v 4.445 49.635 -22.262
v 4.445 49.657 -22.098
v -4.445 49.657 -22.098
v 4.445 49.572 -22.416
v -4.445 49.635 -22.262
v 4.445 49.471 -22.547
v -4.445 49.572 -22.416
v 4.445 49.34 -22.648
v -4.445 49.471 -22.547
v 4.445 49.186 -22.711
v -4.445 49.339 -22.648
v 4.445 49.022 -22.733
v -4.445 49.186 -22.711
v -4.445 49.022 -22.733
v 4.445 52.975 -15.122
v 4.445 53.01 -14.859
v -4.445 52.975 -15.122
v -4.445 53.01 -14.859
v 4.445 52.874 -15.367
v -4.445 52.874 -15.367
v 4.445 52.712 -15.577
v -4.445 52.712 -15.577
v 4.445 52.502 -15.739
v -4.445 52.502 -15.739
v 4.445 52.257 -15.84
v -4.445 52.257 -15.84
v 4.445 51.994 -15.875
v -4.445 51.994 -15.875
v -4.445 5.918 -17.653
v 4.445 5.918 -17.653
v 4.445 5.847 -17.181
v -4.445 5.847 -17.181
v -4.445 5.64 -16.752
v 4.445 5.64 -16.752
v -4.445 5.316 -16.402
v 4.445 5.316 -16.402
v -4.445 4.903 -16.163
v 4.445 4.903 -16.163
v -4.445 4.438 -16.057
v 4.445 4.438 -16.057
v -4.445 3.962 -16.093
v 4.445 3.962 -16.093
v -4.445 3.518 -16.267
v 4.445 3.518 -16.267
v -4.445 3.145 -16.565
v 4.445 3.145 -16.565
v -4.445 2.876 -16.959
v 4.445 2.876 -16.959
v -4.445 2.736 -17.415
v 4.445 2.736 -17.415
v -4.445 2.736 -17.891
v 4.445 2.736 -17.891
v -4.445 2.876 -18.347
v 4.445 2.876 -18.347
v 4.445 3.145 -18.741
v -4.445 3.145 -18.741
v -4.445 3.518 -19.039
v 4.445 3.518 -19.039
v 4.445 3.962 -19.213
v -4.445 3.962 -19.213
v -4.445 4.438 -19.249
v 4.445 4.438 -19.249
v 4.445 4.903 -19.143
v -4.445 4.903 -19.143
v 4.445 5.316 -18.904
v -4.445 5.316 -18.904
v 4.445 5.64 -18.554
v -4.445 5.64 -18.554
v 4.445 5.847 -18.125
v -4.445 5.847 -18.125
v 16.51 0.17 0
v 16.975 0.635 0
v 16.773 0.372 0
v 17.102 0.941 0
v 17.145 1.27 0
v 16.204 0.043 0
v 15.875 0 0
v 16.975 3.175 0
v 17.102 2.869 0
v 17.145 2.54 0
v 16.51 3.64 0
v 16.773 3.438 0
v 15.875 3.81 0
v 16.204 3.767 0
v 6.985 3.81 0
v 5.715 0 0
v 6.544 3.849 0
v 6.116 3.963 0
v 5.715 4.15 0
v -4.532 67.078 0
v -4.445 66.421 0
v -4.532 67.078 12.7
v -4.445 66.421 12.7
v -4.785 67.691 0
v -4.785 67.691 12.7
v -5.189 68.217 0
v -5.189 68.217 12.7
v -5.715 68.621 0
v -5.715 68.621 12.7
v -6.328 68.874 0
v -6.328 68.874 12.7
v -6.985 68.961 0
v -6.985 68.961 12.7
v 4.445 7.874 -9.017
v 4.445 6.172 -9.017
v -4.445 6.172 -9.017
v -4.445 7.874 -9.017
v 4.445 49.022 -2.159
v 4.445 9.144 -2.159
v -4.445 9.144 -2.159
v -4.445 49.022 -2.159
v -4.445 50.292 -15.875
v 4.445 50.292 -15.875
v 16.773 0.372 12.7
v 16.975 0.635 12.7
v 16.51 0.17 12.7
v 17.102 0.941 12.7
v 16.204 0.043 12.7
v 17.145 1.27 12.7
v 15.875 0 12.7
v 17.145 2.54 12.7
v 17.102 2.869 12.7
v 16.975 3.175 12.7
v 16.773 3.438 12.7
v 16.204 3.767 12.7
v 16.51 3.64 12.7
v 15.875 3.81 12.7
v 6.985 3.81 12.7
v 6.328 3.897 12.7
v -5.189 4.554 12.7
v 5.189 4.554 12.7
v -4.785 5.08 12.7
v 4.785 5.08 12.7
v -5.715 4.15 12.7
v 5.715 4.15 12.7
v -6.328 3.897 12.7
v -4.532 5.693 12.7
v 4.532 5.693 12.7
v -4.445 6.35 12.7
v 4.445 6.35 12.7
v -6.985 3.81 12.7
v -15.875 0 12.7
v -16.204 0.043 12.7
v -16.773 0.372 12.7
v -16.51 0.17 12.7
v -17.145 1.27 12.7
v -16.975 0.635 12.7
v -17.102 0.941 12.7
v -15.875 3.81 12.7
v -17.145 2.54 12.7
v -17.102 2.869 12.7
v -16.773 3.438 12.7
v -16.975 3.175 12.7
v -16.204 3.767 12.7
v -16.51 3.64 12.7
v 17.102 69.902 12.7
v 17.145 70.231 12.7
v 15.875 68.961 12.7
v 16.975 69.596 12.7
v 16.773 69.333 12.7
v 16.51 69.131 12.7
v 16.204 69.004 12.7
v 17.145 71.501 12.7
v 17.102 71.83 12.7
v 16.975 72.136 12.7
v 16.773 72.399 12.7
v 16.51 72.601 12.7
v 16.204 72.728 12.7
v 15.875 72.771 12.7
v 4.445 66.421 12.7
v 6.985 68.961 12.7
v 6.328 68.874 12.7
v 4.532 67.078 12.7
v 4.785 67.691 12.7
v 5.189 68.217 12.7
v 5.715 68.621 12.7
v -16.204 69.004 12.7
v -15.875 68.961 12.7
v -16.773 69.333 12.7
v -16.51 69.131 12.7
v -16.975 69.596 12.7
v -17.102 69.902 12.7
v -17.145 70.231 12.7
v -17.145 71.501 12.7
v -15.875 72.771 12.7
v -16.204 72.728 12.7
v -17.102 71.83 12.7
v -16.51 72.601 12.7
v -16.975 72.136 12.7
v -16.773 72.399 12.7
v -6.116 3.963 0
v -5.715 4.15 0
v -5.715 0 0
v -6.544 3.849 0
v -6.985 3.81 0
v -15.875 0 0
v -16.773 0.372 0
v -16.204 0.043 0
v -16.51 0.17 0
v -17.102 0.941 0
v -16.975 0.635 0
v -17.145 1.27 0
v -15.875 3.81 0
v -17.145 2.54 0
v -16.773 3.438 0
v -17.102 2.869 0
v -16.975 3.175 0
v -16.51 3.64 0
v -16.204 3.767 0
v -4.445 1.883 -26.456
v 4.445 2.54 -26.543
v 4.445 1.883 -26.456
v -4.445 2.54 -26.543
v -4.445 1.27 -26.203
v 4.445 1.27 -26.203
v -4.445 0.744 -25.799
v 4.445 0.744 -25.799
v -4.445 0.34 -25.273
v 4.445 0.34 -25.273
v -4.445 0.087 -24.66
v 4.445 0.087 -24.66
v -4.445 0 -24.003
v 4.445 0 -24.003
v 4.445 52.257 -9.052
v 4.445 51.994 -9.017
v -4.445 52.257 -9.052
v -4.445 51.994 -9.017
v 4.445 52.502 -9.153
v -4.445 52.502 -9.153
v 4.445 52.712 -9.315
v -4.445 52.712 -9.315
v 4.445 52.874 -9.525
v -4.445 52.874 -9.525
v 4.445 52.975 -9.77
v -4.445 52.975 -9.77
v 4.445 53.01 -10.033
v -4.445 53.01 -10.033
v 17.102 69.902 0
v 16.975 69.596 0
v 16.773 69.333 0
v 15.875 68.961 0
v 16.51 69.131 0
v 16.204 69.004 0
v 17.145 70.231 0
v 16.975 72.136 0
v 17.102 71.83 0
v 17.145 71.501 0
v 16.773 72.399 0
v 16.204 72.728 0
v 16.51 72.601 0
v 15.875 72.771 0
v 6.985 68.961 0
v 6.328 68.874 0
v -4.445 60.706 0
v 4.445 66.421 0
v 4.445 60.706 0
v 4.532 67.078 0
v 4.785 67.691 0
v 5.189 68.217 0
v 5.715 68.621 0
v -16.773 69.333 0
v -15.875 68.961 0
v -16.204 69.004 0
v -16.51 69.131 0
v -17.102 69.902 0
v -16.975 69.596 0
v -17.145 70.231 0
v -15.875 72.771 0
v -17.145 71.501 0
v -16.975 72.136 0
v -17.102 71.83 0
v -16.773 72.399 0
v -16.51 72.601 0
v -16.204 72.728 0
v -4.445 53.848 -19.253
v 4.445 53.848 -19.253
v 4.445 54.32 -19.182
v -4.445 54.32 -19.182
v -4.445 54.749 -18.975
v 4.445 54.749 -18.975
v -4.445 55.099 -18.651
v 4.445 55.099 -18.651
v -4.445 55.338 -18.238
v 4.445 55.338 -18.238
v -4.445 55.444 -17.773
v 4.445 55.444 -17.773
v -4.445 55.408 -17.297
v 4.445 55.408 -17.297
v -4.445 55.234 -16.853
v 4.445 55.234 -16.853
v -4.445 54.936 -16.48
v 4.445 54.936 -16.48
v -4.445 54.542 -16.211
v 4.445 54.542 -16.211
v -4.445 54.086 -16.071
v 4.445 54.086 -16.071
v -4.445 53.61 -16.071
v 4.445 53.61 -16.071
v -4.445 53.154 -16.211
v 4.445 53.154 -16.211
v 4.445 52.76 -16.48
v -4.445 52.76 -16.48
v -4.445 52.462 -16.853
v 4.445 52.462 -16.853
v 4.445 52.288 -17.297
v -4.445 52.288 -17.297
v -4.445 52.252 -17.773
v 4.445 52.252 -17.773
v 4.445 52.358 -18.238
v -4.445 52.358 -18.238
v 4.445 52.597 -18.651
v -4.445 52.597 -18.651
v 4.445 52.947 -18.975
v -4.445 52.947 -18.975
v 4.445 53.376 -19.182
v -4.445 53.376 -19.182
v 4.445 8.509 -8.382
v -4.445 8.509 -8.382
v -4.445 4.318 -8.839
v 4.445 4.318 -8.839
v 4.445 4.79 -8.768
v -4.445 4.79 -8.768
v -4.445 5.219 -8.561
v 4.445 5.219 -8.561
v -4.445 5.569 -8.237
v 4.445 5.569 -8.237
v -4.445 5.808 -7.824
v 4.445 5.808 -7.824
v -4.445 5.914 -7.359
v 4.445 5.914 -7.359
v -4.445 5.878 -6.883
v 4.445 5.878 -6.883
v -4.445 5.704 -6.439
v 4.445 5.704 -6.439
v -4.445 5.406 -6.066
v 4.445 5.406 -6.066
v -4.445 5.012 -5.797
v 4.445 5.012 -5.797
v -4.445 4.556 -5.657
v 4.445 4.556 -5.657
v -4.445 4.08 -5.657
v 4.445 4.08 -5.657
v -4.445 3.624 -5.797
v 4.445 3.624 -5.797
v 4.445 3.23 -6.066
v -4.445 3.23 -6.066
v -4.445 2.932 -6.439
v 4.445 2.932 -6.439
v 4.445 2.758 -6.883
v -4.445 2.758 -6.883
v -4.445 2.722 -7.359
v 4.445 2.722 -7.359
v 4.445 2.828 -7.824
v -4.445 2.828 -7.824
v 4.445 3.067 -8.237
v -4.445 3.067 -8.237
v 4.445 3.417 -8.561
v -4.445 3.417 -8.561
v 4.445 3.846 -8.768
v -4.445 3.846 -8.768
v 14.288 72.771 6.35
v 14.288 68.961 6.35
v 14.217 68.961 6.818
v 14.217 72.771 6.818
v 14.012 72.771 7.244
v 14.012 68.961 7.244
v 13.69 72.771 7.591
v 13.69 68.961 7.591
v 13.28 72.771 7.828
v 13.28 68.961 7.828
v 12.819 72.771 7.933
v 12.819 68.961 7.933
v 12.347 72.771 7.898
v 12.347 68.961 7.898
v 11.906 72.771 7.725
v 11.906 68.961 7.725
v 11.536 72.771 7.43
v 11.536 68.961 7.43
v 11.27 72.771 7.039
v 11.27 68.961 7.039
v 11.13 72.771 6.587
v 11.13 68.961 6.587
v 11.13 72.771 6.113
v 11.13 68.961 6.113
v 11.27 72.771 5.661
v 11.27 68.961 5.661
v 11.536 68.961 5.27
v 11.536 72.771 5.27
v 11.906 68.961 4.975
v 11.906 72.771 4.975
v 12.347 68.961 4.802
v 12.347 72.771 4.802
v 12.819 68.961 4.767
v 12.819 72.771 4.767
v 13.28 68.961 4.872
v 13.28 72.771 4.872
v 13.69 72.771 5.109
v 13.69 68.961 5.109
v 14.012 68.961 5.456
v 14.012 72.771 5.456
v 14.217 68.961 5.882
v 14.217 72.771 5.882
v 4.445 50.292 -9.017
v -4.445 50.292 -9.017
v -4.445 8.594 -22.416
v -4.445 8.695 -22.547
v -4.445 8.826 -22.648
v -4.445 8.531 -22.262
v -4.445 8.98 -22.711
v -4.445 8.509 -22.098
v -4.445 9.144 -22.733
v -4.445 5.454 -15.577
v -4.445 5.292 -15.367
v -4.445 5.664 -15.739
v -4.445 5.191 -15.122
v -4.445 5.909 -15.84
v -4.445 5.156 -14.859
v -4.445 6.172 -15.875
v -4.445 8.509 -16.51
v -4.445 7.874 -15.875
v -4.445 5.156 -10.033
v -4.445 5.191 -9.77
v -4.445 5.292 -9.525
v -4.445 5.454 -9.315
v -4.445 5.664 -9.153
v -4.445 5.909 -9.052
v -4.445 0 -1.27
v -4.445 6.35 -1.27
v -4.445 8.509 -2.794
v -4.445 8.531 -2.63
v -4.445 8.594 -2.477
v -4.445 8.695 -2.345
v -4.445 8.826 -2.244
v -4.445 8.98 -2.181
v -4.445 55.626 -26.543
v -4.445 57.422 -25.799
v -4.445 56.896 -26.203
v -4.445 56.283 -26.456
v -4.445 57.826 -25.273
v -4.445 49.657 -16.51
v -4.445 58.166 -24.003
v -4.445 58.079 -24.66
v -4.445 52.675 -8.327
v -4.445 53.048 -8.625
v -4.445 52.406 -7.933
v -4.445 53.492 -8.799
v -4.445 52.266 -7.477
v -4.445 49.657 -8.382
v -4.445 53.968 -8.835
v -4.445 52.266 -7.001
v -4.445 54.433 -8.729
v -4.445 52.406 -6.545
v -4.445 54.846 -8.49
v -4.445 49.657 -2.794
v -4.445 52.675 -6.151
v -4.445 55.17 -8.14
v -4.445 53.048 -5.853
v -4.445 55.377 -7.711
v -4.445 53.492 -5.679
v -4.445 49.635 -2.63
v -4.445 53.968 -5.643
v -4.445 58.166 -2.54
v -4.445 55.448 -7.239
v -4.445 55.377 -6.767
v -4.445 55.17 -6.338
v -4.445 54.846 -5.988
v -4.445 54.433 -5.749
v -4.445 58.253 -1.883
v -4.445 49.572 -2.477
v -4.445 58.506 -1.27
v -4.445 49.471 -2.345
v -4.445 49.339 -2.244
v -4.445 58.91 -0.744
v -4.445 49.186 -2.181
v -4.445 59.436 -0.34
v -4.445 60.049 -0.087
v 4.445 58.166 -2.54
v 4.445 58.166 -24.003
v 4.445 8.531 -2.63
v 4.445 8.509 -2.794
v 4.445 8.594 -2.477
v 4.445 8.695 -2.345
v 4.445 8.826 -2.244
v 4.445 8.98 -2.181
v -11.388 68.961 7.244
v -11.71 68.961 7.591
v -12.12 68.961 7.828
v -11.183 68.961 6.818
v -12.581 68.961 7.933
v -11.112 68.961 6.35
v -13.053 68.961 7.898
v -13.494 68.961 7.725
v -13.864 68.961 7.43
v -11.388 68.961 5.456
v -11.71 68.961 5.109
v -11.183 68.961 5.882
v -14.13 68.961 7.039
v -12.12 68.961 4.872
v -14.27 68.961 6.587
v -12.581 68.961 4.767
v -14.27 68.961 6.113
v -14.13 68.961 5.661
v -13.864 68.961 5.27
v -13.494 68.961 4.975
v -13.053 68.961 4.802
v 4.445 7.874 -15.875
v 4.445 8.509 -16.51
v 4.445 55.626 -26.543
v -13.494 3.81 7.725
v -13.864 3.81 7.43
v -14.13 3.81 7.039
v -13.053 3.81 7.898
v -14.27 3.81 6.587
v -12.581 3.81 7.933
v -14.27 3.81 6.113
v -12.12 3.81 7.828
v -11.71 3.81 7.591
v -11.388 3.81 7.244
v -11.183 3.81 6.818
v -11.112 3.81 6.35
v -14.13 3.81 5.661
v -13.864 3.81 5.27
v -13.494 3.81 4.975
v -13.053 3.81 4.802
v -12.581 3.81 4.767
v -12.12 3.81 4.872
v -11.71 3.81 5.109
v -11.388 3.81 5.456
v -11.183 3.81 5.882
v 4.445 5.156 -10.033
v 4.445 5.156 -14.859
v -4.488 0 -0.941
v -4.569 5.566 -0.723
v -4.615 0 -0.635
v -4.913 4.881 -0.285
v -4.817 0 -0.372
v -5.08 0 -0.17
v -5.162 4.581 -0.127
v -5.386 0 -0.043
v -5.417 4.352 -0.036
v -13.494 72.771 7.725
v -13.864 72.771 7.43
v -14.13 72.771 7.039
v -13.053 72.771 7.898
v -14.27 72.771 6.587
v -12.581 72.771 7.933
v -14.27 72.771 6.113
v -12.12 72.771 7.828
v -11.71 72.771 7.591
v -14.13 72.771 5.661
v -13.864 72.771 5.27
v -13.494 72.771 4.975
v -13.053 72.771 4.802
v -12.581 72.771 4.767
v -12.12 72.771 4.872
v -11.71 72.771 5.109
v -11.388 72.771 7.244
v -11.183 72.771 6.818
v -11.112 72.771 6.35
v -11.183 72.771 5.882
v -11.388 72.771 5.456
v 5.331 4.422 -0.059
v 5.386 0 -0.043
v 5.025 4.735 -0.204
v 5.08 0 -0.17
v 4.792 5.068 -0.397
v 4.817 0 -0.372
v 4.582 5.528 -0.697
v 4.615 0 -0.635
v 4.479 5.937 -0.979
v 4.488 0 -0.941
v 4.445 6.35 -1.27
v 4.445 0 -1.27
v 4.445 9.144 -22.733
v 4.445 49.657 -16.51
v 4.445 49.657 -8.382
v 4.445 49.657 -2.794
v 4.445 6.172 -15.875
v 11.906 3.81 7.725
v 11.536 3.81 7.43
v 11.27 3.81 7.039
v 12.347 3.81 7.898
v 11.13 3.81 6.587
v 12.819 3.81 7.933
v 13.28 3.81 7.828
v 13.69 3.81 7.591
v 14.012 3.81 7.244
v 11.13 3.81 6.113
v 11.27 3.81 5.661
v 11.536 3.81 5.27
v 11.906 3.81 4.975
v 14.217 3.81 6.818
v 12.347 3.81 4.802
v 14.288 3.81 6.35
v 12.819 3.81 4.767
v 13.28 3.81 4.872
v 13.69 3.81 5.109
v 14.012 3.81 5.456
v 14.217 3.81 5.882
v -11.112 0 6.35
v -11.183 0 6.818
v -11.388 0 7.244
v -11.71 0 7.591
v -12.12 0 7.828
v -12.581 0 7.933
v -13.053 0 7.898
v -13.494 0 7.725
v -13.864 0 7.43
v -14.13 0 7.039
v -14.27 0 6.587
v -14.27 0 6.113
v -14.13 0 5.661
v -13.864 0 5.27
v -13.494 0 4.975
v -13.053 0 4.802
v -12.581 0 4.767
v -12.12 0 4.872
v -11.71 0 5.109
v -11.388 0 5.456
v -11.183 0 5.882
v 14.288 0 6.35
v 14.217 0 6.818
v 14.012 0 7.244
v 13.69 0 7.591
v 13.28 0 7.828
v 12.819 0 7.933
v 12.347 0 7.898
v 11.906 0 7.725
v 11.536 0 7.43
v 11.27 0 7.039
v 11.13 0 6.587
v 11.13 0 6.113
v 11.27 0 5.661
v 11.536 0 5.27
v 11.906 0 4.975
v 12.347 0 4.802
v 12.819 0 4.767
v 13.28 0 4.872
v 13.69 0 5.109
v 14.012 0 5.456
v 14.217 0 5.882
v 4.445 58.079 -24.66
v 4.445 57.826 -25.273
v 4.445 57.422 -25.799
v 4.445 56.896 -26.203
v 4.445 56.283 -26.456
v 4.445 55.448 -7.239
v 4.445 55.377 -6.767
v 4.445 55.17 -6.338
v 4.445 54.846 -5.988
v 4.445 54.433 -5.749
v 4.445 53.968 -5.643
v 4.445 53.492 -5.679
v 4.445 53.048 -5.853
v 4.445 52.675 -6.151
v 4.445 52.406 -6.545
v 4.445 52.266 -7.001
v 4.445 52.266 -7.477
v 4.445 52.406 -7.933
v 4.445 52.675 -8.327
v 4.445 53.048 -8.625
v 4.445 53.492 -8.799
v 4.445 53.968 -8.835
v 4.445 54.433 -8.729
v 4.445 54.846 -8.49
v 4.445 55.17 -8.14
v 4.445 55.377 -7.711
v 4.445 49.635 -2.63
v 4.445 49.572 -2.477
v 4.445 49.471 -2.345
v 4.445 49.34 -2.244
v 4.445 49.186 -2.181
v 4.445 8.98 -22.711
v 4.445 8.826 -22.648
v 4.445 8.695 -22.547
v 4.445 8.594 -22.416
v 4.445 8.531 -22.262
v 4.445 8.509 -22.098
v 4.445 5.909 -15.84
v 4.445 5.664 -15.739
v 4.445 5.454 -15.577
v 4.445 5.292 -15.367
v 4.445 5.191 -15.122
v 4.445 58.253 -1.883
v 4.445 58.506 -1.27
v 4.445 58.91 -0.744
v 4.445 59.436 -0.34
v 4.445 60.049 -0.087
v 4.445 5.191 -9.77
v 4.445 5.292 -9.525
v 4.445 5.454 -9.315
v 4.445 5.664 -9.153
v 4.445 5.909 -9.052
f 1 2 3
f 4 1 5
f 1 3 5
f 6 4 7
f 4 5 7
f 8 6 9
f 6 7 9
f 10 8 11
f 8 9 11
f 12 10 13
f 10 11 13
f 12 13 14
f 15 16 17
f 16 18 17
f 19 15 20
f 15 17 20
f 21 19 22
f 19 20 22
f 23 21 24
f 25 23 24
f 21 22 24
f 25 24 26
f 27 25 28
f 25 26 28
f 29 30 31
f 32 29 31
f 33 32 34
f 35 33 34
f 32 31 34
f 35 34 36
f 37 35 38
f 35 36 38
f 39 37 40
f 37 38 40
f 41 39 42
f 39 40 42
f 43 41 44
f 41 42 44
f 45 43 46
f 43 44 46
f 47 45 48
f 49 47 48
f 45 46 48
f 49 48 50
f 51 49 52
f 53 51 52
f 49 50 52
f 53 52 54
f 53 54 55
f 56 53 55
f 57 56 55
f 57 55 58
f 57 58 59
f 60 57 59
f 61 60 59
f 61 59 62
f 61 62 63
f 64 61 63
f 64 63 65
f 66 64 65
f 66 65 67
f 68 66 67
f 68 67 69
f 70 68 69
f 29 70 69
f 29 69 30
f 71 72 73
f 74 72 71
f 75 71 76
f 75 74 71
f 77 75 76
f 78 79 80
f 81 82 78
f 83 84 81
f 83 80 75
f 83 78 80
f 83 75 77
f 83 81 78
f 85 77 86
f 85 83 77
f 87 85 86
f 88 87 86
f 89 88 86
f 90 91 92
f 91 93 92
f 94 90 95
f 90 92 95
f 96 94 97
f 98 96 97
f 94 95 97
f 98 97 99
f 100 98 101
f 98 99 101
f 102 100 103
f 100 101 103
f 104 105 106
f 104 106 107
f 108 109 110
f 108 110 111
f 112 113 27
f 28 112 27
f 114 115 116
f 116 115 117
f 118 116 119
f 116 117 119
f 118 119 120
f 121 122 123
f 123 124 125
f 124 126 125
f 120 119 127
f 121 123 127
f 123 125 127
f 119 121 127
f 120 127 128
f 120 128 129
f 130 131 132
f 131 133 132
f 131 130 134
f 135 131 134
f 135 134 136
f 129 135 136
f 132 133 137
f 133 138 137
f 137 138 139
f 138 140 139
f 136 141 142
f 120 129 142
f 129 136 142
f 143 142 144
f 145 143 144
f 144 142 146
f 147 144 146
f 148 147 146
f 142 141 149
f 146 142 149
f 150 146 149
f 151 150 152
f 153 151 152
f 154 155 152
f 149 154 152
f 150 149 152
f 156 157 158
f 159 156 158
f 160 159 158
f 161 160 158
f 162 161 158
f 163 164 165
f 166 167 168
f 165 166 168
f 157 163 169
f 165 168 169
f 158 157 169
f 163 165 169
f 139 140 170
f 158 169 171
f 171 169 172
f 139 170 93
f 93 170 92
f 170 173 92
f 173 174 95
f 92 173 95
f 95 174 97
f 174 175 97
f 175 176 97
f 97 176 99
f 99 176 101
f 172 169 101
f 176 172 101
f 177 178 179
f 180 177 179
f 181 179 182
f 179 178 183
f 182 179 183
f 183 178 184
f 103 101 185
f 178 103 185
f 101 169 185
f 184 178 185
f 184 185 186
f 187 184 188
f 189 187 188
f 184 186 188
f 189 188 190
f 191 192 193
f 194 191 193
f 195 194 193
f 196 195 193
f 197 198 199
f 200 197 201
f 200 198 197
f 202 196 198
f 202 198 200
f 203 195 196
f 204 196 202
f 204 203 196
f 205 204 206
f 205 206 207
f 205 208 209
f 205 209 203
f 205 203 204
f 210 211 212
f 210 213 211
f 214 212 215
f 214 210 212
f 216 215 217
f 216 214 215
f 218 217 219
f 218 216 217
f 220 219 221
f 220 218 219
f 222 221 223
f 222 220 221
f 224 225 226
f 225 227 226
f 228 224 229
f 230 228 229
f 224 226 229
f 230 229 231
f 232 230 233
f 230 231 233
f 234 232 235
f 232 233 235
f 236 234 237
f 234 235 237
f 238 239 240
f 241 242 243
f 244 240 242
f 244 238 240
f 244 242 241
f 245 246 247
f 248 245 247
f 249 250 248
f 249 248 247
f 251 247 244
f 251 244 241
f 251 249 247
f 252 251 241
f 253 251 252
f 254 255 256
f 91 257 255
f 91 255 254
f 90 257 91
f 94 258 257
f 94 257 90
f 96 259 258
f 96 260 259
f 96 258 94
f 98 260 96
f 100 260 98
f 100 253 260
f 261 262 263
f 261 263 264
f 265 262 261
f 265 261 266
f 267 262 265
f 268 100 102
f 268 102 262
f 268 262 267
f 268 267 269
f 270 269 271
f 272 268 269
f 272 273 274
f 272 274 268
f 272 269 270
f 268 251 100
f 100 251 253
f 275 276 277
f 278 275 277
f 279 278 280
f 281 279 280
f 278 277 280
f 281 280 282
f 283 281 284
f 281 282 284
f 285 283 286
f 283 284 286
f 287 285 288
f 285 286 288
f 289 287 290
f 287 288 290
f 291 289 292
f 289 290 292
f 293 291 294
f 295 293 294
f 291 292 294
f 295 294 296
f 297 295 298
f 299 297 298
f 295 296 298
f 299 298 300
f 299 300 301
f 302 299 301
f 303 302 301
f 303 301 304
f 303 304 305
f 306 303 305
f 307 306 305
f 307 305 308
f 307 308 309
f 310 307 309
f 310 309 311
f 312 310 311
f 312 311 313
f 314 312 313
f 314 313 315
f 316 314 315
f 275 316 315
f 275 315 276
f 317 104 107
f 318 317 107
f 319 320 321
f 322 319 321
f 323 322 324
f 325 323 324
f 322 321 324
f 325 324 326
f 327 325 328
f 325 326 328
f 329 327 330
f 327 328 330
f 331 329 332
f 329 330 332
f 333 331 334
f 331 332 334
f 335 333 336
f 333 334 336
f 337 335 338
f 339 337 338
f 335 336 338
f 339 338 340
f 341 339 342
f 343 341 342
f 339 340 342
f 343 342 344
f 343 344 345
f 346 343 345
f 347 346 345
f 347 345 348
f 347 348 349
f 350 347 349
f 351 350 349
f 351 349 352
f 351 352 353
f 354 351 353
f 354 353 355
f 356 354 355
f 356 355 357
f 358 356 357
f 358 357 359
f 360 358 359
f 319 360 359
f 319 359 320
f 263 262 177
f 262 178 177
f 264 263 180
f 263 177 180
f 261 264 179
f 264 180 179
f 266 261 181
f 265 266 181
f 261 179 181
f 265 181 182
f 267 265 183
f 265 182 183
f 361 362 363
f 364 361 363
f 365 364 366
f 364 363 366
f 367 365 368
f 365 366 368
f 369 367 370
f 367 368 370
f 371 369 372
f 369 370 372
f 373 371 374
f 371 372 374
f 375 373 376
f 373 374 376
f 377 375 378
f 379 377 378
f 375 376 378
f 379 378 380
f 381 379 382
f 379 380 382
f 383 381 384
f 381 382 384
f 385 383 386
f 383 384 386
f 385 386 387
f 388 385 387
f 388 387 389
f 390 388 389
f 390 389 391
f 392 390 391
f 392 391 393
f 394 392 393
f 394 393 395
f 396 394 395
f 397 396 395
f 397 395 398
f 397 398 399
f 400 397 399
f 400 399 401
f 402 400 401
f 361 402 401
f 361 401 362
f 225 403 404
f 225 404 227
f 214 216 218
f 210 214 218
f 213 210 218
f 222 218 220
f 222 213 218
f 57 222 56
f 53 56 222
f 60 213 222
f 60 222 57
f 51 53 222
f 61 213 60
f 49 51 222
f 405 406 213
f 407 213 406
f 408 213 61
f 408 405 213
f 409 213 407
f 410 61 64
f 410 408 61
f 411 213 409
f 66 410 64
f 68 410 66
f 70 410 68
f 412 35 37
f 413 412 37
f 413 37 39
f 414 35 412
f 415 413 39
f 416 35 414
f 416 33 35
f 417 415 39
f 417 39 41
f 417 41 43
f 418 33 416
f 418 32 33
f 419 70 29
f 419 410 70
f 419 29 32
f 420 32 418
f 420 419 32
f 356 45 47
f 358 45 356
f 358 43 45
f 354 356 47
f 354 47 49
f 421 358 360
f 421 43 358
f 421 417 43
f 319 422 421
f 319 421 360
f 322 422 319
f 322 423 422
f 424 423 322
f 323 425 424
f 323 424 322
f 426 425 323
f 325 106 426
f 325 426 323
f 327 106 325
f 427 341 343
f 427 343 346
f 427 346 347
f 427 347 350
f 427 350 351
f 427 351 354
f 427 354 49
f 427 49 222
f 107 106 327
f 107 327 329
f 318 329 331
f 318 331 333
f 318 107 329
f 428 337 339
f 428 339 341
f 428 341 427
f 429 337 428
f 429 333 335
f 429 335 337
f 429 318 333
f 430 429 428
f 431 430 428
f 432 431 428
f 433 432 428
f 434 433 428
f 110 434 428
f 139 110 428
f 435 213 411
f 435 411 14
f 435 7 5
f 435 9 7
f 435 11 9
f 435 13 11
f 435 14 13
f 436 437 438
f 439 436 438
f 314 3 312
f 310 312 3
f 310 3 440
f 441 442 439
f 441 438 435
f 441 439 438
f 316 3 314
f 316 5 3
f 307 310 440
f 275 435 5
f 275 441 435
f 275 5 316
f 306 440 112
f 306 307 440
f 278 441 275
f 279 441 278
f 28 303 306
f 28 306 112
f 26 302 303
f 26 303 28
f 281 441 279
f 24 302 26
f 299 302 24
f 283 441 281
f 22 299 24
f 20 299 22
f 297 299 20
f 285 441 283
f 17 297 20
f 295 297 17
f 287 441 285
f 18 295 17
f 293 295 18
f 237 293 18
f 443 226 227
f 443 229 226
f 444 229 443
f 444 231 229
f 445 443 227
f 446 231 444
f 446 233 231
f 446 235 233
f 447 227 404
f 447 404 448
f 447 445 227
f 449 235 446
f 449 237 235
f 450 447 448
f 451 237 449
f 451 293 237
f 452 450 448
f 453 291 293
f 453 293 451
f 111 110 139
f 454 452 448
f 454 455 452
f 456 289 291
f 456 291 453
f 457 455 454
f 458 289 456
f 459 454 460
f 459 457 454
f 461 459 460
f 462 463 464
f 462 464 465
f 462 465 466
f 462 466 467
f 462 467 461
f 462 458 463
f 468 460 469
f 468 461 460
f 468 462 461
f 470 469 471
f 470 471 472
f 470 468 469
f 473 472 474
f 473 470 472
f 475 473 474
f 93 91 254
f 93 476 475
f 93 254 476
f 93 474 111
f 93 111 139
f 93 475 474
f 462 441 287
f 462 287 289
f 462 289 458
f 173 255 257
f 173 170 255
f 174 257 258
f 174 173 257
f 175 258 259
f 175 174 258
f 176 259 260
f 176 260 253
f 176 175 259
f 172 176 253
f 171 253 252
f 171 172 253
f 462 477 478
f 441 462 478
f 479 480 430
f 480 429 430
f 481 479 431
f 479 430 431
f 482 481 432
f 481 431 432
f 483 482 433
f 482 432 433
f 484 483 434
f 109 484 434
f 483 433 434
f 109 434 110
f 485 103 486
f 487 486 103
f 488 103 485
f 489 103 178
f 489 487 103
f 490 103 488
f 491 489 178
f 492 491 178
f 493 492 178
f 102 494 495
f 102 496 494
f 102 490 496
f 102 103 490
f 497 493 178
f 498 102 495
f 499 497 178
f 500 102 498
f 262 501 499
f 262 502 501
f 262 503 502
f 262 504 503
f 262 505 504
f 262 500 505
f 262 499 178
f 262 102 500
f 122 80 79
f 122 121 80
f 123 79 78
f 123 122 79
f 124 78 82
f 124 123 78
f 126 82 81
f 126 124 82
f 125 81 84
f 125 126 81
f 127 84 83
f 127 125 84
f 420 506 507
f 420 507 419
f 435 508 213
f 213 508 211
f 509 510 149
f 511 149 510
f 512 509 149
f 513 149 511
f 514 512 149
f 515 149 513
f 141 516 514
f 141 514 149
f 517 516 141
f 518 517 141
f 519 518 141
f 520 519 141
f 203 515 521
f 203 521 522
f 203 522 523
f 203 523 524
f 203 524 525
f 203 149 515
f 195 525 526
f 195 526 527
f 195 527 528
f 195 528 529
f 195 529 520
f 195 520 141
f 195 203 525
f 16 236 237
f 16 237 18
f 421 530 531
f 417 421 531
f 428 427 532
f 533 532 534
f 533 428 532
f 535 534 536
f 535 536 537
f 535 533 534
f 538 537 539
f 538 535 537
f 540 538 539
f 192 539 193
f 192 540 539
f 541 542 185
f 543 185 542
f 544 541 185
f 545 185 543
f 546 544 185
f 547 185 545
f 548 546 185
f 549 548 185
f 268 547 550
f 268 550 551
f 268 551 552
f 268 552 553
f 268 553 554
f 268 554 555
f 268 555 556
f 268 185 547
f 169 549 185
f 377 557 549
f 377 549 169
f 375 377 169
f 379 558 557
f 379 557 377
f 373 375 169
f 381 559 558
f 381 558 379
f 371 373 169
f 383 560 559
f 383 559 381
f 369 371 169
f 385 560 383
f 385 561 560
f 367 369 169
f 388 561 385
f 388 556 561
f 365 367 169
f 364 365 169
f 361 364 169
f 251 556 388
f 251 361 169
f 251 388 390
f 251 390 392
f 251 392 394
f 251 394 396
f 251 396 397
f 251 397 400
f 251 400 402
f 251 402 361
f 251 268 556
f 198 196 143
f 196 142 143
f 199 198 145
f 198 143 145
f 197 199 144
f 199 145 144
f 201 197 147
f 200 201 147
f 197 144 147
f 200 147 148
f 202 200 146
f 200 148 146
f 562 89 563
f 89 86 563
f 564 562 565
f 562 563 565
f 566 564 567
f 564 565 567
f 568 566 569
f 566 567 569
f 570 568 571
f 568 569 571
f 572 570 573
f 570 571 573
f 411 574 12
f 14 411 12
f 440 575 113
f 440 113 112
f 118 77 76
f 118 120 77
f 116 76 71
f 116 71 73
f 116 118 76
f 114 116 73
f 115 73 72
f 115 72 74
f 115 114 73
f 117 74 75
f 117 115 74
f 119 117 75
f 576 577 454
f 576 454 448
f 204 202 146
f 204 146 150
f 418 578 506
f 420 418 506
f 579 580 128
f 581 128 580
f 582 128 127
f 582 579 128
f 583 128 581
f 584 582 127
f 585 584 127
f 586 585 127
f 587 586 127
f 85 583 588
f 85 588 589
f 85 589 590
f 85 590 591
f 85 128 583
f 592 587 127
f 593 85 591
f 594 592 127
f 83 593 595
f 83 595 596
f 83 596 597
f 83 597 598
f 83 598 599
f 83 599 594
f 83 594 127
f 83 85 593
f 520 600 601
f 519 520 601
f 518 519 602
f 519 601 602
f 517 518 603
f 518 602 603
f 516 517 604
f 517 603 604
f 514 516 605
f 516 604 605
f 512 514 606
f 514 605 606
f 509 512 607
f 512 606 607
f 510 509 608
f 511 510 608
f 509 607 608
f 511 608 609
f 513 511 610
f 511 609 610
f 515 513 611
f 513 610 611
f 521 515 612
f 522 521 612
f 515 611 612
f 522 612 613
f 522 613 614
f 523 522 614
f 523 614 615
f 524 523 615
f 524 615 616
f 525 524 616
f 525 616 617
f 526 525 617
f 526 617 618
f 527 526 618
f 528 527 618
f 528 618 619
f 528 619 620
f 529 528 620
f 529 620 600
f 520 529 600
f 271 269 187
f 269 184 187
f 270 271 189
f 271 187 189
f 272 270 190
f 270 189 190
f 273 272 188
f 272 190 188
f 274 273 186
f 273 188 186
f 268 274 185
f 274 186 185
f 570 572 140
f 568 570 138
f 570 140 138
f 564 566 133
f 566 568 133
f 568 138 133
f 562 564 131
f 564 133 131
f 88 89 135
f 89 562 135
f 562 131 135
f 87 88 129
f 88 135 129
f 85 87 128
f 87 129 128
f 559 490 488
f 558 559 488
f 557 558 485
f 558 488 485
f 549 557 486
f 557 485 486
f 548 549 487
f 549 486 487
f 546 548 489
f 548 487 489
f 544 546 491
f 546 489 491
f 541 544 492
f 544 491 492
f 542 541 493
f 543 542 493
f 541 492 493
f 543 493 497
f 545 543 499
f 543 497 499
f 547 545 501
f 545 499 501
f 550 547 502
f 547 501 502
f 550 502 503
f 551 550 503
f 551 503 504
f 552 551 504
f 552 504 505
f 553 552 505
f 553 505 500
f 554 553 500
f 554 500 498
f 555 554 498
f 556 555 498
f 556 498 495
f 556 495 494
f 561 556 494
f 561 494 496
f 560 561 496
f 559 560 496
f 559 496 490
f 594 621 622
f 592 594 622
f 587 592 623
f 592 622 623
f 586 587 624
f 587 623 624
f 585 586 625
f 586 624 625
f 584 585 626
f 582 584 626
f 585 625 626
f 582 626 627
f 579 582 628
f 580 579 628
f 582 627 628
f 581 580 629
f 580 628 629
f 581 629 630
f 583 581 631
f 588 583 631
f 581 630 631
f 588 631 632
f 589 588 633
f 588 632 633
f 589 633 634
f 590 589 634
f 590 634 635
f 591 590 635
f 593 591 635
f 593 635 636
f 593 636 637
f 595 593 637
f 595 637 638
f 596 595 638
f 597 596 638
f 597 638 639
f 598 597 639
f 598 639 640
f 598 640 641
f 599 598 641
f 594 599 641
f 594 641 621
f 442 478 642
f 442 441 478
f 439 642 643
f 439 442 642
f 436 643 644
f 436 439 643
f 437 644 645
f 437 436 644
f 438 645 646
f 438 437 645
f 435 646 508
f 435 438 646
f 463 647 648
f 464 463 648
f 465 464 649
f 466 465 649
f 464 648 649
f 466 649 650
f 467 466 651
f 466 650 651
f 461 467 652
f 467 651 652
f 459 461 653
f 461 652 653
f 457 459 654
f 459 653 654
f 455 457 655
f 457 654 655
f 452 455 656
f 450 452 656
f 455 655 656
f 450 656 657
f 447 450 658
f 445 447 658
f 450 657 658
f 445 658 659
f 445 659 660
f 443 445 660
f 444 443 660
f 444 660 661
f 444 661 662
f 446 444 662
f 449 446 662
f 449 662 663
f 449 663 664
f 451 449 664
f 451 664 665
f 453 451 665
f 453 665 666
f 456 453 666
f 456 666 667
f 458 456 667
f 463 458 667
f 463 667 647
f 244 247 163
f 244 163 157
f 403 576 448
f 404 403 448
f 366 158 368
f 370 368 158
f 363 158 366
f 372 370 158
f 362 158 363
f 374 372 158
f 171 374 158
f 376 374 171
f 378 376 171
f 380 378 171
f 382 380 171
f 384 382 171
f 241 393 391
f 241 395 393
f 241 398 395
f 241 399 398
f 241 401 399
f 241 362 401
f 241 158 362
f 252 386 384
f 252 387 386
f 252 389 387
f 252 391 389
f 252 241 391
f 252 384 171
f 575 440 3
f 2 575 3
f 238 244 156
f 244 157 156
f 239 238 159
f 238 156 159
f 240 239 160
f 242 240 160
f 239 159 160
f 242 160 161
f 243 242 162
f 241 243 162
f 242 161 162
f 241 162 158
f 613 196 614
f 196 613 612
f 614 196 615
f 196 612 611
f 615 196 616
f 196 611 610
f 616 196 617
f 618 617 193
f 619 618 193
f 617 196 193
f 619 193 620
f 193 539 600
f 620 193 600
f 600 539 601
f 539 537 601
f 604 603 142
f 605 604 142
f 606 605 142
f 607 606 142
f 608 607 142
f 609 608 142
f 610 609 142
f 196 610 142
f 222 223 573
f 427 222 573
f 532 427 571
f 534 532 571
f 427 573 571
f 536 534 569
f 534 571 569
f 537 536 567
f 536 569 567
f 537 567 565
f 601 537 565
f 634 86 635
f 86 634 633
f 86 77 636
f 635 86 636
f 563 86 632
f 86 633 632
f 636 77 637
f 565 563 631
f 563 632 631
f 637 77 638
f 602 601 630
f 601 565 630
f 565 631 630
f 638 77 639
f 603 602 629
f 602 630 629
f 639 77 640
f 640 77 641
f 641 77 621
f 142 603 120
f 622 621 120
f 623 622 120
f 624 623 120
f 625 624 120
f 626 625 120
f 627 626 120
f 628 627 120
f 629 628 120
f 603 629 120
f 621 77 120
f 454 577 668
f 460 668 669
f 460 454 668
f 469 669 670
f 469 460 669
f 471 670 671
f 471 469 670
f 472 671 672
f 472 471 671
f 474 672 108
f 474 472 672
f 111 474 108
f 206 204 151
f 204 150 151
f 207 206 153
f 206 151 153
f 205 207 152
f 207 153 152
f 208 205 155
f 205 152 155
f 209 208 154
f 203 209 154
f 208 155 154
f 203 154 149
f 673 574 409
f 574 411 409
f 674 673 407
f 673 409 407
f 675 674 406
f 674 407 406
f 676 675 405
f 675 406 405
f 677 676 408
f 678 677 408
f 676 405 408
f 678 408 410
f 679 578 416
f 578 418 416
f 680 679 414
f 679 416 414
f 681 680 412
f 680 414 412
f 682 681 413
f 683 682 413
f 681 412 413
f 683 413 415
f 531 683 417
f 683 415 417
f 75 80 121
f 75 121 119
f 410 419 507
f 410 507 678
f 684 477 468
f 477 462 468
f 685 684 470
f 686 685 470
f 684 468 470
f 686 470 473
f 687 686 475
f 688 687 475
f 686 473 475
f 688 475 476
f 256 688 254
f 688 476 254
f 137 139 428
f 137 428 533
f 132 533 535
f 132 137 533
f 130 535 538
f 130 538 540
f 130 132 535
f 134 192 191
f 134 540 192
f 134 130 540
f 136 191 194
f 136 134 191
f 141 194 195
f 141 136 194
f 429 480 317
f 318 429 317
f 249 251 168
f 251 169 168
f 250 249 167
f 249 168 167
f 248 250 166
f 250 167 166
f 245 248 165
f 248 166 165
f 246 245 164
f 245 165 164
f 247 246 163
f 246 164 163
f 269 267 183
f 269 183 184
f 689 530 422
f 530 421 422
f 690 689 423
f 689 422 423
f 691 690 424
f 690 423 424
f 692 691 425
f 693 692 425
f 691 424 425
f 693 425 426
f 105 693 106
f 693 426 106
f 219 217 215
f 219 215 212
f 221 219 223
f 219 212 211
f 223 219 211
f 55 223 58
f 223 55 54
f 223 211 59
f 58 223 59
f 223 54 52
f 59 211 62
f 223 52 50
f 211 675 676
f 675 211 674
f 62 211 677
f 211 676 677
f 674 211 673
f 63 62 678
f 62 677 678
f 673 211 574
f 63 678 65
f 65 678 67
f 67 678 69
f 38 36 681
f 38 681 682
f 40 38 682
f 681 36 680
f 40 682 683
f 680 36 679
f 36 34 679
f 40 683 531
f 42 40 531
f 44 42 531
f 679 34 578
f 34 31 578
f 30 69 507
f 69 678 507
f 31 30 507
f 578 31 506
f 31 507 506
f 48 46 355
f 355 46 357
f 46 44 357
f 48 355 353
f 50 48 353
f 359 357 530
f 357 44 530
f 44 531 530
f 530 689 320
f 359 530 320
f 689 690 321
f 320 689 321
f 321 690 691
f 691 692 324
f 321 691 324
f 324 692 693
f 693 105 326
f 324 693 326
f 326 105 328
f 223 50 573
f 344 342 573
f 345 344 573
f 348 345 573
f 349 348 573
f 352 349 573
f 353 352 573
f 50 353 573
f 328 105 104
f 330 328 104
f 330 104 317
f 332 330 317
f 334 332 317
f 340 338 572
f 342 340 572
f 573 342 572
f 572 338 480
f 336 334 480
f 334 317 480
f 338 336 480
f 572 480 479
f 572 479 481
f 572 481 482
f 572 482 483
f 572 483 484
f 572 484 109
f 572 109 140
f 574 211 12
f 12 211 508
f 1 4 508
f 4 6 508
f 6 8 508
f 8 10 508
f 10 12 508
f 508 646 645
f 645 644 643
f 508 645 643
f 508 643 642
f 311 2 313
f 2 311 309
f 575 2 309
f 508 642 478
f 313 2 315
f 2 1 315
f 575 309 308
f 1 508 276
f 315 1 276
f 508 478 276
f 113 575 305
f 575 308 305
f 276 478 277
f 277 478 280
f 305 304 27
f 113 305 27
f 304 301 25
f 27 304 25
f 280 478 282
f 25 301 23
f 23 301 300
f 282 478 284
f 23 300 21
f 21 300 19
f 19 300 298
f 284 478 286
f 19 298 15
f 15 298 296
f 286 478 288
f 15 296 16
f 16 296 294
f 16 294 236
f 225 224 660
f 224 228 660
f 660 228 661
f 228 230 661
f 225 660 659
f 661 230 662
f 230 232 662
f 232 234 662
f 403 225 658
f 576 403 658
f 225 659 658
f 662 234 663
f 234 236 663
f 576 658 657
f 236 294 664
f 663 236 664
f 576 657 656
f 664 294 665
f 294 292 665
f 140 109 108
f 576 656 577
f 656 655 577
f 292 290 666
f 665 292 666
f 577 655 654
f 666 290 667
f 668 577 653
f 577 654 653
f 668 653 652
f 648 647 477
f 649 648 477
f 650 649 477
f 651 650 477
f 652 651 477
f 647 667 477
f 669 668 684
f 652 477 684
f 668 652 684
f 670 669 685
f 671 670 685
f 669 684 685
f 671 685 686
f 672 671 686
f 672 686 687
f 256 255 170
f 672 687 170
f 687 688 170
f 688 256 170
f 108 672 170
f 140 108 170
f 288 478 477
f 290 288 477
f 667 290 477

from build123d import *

# Parameters (mm, degrees)
FRAME_MOUNT_DEPTH         = 12.7
SKETCH3_R                 = 1.5875000000000008
SKETCH3_R_2               = 1.5875000000000024
MOUNT_HOLES_DEPTH         = 76.8344213797402
SKETCH4_W                 = 20.574
SKETCH4_H                 = 41.148
SERVO_MOUNT_FEATURE_DEPTH = 8.889999999999999
SKETCH5_R                 = 1.6001999999999992
SKETCH5_R_2               = 1.6001999999999998
SKETCH5_R_3               = 1.6002000000000005
SKETCH5_R_4               = 1.600200000000004
SERVO_MOUNT_HOLES_DEPTH   = 81.41316677012539
FILLET1_R                 = 2.54
FILLET2_R                 = 1.27
FILLET3_R                 = 0.635
FILLET4_R                 = 1.27
SKETCH6_W                 = 6.8580000000000005
SKETCH6_H                 = 3.352800000000009
SKETCH6_H_2               = 3.352800000000002
SERVOWIRE_GAP_DEPTH       = 81.41316677012539
FILLET5_R                 = 1.016
CHAMFER1_SIZE             = 0.635


with BuildPart() as part:
    # Sketch1 → Frame_Mount (new body)
    with BuildSketch(Plane.XY):
        Polygon((17.144999999999985, -4.04e-15), (-17.144999999999985, -4.04e-15), (-17.144999999999985, 3.809999999999992), (-4.444999999999985, 3.809999999999999), (-4.444999999999985, 68.96100000000001), (-17.144999999999985, 68.961), (-17.144999999999985, 72.77099999999999), (17.144999999999985, 72.77099999999999), (17.145000000000014, 68.961), (4.445000000000014, 68.961), (4.445000000000014, 3.809999999999999), (17.145000000000014, 3.8099999999999863), align=None)
    extrude(amount=FRAME_MOUNT_DEPTH)

    # Sketch3 → Mount_Holes (cut, through all)
    with BuildSketch(Plane.XZ):
        with Locations((12.7, 6.35)):
            Circle(SKETCH3_R)
        with Locations((-12.7, 6.35)):
            Circle(SKETCH3_R_2)
    extrude(amount=-MOUNT_HOLES_DEPTH, mode=Mode.SUBTRACT)

    # Sketch4 → Servo_Mount_Feature (add)
    with BuildSketch(Plane(origin=(4.445000000000014, 0, 0), x_dir=(0, 0, -1), z_dir=(1, 3.9e-16, 0))):
        Polygon((7.11e-15, 58.166000000000004), (26.543000000000006, 58.166), (26.543000000000006, -6.94e-15), (6.94e-15, -9.04e-15), align=None)
        with Locations((12.446000000000007, 29.082999999999995)):
            Rectangle(SKETCH4_W, SKETCH4_H, mode=Mode.SUBTRACT)
    extrude(amount=-SERVO_MOUNT_FEATURE_DEPTH)

    # Sketch5 → Servo_Mount_Holes (cut, through all)
    with BuildSketch(Plane(origin=(4.445000000000014, 0, 0), x_dir=(0, 0, -1), z_dir=(1, 3.9e-16, 0))):
        with Locations(Location((7.239000000000005, 53.84799999999999, 0), (0, 0, 90))):
            Circle(SKETCH5_R)
        with Locations((17.653000000000006, 53.84799999999999)):
            Circle(SKETCH5_R_2)
        with Locations(Location((17.653000000000006, 4.318000000000002, 0), (0, 0, 90))):
            Circle(SKETCH5_R_3)
        with Locations((7.239000000000006, 4.317999999999992)):
            Circle(SKETCH5_R_4)
    extrude(amount=-SERVO_MOUNT_HOLES_DEPTH, mode=Mode.SUBTRACT)

    # Fillet1
    fillet1_edges = [part.edges().sort_by_distance(p)[0] for p in [
        (-4.444999999999985, 3.809999999999999, 6.35),
        (-4.444999999999985, 68.96100000000001, 6.35),
        (4.445000000000014, 68.961, 6.35),
        (4.445000000000014, 3.809999999999999, 6.35),
        (-8.88e-15, 58.166000000000004, -7.11e-15),
        (-8.88e-15, 58.166, -26.543000000000006),
        (1.421e-14, -8.69e-15, -26.543000000000006),
    ]]
    fillet(fillet1_edges, radius=FILLET1_R)

    # Fillet2
    fillet2_edges = [part.edges().sort_by_distance(p)[0] for p in [
        (-4.444999999999986, 3.174999999999993, -3.47e-15),
        (4.445000000000013, 3.174999999999993, -3.47e-15),
    ]]
    fillet(fillet2_edges, radius=FILLET2_R)

    # Fillet3
    fillet3_edges = [part.edges().sort_by_distance(p)[0] for p in [
        (-5.33e-15, 49.65699999999999, -2.159000000000006),
        (-5.33e-15, 49.65699999999999, -22.733000000000008),
        (1.066e-14, 8.508999999999993, -22.733000000000008),
        (1.066e-14, 8.508999999999993, -2.159000000000006),
    ]]
    fillet(fillet3_edges, radius=FILLET3_R)

    # Fillet4
    fillet4_edges = [part.edges().sort_by_distance(p)[0] for p in [
        (-17.144999999999985, 3.809999999999992, 6.35),
        (-17.144999999999985, 68.961, 6.35),
        (-17.144999999999985, 72.77099999999999, 6.35),
        (17.144999999999985, 72.77099999999999, 6.35),
        (17.145000000000014, 68.961, 6.35),
        (17.145000000000014, 3.8099999999999863, 6.35),
        (17.144999999999985, -4.04e-15, 6.35),
        (-17.144999999999985, -4.04e-15, 6.35),
    ]]
    fillet(fillet4_edges, radius=FILLET4_R)

    # Sketch6 → ServoWire-Gap (cut, through all)
    with BuildSketch(Plane(origin=(4.445000000000014, 0, 0), x_dir=(0, 0, -1), z_dir=(1, 0, 0))):
        with Locations((12.446000000000007, 51.3334)):
            Rectangle(SKETCH6_W, SKETCH6_H)
        with Locations((12.446000000000007, 6.832599999999994)):
            Rectangle(SKETCH6_W, SKETCH6_H_2)
    extrude(amount=-SERVOWIRE_GAP_DEPTH, mode=Mode.SUBTRACT)

    # Fillet5
    fillet5_edges = [part.edges().sort_by_distance(p)[0] for p in [
        (3.55e-15, 53.009800000000006, -9.017000000000007),
        (3.55e-15, 53.009800000000006, -15.875000000000007),
        (1.332e-14, 5.156199999999993, -15.875000000000007),
        (1.332e-14, 5.156199999999993, -9.017000000000007),
    ]]
    fillet(fillet5_edges, radius=FILLET5_R)

    # Chamfer1
    chamfer1_edges = [part.edges().sort_by_distance(p)[0] for p in [
        (1.243e-14, 8.508999999999995, -9.017000000000007),
        (1.243e-14, 8.508999999999995, -15.875000000000007),
        (4.44e-15, 49.657, -9.017000000000007),
        (4.44e-15, 49.657, -15.875000000000007),
    ]]
    chamfer(chamfer1_edges, length=CHAMFER1_SIZE)


solid = part.part
